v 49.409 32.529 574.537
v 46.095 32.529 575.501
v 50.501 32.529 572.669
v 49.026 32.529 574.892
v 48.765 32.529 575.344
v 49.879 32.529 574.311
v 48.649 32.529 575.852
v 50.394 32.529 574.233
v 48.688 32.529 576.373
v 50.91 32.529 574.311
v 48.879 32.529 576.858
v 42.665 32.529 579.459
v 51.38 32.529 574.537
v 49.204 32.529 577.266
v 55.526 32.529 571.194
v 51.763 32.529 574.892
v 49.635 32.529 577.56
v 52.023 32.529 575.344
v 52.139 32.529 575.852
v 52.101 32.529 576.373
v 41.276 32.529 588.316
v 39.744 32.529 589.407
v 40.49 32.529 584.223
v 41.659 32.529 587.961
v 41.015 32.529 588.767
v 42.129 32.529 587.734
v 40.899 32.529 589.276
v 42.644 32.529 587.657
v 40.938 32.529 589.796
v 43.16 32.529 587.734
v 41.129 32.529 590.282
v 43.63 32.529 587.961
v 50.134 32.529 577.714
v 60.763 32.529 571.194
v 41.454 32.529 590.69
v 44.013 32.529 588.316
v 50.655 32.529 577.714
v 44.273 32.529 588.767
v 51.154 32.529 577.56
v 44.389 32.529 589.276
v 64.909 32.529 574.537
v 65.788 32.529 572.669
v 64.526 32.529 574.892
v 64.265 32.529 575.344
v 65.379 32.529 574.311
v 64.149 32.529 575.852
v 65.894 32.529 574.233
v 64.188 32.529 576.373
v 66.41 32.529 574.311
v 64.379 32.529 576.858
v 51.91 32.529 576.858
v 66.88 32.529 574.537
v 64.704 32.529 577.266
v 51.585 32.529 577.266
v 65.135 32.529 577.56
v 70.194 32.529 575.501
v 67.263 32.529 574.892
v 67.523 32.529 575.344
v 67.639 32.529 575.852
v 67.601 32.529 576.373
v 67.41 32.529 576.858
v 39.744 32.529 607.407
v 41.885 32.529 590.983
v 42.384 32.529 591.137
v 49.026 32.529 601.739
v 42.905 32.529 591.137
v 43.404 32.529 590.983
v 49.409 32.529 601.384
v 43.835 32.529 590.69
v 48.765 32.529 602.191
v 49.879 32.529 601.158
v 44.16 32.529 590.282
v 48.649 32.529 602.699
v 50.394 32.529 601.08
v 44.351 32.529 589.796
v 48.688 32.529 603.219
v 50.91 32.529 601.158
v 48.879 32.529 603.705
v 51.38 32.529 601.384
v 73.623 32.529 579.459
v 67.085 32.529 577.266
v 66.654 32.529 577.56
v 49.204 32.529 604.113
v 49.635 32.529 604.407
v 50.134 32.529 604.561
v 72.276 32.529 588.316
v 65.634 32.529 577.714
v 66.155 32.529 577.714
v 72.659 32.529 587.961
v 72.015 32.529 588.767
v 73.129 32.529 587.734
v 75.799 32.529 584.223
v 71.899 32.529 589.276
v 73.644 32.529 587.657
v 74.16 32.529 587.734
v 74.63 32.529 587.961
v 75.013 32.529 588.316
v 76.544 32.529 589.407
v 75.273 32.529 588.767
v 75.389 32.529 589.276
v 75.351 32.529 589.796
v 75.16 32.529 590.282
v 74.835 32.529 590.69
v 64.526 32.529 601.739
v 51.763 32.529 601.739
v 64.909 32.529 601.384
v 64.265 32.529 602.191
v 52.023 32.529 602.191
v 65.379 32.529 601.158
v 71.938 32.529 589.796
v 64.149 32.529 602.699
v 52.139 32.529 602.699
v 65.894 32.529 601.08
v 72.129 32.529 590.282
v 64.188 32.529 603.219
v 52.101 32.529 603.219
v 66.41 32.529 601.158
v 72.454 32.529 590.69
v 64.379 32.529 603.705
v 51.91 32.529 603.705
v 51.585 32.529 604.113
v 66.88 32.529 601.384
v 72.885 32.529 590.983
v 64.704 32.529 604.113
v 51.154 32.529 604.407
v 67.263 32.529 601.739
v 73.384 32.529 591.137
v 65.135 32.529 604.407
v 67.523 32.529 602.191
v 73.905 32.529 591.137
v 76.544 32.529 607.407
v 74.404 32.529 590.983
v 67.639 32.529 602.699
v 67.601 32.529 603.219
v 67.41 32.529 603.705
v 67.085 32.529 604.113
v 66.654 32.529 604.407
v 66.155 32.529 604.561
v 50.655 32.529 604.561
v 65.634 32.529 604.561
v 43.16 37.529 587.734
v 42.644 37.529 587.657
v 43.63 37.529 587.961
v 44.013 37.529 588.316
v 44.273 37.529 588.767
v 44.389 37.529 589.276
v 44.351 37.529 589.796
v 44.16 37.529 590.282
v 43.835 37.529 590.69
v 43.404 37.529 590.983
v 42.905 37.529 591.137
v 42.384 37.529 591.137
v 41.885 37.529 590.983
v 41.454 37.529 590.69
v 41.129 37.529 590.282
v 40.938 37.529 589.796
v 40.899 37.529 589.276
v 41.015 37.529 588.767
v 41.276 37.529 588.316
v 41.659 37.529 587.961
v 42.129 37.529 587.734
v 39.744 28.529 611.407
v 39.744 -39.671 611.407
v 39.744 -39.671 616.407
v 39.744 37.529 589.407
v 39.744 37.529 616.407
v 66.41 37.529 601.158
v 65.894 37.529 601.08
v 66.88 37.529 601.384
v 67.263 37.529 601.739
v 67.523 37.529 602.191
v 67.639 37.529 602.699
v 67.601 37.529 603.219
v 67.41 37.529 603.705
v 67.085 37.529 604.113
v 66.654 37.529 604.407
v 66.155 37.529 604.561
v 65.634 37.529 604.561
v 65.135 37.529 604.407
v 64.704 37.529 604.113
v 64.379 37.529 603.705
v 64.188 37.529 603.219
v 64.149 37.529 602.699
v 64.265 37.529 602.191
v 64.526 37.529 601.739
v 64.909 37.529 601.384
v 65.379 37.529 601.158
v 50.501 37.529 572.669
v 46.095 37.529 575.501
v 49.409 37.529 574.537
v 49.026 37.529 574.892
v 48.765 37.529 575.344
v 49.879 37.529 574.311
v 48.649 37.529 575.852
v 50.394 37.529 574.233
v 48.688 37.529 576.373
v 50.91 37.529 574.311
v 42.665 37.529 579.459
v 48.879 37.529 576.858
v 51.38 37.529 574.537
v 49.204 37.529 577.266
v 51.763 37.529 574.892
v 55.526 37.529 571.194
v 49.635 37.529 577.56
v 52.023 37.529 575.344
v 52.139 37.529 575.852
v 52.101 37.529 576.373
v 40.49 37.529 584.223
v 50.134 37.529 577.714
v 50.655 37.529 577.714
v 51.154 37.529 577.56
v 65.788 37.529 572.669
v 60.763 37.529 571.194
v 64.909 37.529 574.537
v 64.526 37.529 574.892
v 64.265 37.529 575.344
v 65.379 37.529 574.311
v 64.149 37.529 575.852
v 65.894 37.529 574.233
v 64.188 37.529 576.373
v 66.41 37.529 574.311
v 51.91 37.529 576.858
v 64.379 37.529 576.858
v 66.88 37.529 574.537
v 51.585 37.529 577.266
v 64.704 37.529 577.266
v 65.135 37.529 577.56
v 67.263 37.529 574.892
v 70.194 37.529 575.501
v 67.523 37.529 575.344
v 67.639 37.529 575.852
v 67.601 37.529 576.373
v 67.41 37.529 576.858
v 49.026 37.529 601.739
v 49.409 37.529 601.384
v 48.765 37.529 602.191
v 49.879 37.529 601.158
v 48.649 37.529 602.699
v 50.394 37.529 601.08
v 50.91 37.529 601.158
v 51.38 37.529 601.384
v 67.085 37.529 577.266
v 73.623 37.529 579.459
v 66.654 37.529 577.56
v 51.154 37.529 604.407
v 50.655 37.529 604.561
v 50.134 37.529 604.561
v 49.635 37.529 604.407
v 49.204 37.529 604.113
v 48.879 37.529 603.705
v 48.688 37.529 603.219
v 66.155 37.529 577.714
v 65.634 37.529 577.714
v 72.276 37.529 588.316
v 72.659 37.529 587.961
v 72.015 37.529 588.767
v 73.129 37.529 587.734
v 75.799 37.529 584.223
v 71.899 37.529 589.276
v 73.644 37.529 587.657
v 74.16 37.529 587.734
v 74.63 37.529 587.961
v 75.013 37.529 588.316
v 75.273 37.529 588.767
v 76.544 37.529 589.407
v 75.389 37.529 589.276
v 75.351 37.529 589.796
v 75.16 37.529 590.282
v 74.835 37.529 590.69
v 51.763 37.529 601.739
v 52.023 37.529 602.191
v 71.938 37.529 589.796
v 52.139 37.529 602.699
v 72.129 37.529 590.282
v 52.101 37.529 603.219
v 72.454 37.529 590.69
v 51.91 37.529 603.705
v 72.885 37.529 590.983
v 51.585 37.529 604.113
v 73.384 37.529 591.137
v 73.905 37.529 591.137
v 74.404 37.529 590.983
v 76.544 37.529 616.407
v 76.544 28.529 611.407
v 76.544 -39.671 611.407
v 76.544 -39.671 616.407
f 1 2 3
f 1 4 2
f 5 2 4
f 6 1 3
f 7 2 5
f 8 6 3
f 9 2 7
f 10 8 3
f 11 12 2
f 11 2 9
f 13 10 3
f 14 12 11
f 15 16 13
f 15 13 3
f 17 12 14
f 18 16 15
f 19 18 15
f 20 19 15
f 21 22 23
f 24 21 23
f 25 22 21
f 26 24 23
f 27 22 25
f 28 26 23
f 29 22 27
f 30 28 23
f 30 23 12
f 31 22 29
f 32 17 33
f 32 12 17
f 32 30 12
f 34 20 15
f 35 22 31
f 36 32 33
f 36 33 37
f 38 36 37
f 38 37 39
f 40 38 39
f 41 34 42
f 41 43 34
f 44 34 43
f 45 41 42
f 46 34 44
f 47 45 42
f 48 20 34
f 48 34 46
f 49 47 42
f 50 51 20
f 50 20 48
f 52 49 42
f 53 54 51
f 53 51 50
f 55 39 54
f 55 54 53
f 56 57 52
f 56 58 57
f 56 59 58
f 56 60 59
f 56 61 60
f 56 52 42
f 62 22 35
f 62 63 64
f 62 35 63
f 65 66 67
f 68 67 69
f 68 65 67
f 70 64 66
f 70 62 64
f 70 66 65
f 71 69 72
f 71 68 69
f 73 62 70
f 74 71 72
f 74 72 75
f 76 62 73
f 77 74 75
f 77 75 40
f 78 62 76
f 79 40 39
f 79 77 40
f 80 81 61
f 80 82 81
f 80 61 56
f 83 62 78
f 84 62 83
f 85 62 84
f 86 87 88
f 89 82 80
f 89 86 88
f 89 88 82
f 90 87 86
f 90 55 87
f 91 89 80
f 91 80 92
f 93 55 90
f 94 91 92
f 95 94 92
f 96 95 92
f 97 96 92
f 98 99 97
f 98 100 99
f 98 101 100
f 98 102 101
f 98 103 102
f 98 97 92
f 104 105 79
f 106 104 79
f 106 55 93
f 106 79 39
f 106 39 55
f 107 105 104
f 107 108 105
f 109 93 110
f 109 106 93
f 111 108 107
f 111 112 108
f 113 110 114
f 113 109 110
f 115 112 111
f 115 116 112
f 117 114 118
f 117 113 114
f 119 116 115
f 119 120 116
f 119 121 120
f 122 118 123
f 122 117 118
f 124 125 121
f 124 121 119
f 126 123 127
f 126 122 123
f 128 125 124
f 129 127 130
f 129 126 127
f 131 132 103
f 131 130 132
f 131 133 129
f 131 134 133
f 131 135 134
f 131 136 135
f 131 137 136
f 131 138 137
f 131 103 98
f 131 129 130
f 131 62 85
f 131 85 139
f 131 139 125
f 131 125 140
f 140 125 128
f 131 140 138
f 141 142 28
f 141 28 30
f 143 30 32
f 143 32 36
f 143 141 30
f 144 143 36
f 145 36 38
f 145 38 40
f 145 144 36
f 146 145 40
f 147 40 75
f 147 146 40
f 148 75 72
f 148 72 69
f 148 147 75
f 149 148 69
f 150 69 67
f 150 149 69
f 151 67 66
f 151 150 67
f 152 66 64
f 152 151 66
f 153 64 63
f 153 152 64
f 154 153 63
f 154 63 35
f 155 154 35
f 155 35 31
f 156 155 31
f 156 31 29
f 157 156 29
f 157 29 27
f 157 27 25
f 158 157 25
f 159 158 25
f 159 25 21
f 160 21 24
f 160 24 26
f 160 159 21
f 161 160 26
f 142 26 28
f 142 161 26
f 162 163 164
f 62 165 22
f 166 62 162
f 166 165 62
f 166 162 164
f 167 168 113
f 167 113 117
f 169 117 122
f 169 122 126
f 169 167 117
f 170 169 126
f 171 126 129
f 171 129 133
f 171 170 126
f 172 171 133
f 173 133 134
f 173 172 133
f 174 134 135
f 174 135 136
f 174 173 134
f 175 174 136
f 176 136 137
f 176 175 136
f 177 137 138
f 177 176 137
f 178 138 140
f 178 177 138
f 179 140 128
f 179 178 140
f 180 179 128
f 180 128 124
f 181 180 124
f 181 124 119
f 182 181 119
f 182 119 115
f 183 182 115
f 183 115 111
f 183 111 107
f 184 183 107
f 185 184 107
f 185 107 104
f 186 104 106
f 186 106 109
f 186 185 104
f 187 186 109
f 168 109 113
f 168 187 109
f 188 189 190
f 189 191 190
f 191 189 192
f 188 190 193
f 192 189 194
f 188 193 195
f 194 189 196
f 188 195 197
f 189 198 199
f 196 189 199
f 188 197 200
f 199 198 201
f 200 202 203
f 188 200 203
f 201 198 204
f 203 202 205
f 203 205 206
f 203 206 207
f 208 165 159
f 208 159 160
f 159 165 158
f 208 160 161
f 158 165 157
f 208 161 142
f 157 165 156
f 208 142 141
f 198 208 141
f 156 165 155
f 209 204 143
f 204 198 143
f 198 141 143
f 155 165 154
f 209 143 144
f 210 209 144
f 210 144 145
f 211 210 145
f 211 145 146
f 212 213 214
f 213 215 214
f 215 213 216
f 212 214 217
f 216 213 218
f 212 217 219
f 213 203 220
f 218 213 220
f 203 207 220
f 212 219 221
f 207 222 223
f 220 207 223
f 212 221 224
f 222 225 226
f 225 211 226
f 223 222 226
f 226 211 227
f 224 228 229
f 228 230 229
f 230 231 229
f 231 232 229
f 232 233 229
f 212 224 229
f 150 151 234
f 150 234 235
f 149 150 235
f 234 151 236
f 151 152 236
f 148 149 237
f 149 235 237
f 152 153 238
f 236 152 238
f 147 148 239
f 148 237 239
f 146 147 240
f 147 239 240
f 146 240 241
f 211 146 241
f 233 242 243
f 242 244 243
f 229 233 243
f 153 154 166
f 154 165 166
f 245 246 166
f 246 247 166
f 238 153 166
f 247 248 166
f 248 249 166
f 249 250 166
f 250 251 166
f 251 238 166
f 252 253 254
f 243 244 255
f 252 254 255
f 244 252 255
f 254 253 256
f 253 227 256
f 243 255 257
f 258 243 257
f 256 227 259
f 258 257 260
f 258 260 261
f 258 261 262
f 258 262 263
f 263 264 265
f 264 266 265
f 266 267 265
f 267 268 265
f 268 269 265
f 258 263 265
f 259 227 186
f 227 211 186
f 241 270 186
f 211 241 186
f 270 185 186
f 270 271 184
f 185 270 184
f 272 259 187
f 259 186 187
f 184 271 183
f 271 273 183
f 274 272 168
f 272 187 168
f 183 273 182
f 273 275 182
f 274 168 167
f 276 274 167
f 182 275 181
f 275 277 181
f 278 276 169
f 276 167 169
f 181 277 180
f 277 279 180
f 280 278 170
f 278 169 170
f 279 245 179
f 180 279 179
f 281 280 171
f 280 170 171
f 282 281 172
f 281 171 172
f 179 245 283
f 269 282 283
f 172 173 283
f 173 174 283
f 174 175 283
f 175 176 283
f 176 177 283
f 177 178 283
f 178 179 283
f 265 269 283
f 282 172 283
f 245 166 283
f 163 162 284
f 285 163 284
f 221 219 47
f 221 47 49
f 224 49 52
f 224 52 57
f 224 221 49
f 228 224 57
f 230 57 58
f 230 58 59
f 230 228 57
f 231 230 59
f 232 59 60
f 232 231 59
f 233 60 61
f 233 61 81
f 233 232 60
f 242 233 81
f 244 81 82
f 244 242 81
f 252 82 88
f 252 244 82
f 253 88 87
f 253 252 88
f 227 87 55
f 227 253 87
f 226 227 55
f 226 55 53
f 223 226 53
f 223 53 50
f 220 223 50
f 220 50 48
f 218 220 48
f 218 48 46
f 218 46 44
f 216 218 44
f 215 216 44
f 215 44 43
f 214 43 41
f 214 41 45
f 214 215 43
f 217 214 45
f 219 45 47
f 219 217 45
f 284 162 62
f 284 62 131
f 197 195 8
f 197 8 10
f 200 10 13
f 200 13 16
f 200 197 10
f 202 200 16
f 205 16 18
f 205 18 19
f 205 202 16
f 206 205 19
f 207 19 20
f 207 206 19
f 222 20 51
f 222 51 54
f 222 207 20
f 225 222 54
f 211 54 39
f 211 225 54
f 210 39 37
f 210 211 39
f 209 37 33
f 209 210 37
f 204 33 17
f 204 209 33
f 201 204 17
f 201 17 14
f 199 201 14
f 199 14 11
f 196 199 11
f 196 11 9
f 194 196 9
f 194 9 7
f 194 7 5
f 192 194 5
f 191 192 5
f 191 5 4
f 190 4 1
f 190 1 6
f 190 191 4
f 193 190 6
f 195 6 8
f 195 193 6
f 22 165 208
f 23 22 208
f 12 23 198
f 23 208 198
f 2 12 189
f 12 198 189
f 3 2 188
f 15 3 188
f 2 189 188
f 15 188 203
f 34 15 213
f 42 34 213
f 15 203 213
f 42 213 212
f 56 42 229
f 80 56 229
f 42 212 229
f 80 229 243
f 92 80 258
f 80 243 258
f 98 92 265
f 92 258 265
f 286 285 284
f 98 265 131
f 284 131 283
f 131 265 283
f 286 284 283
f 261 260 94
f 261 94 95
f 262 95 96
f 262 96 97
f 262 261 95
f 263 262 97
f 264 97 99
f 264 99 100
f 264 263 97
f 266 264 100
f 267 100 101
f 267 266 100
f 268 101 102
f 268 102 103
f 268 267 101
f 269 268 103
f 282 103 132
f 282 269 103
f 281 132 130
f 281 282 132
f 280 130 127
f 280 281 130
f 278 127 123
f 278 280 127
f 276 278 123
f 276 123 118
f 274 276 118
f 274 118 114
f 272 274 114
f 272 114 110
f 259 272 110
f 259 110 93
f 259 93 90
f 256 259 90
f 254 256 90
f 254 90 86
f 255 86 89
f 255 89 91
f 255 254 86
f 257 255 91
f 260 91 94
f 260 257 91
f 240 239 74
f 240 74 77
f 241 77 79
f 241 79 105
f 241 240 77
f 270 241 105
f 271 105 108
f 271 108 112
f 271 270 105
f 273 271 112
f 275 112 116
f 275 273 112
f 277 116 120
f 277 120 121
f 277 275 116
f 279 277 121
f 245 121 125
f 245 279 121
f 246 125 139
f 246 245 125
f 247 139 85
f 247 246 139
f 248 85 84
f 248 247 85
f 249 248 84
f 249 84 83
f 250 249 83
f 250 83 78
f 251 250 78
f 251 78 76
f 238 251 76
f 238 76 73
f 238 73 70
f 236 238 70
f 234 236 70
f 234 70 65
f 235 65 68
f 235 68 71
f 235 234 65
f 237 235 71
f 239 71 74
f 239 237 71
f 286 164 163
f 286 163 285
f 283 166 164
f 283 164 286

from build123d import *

# Parameters (mm, degrees)
SZKIC2_R                    = 1.75
DODANIE_WYCI_GNI_CIE1_DEPTH = 5
SZKIC3_W                    = 36.8
SZKIC3_H                    = 5
DODANIE_WYCI_GNI_CIE2_DEPTH = 72.2
SFAZOWANIE1_SIZE            = 4


with BuildPart() as part:
    # Szkic2 → Dodanie-wyciągnięcie1 (new body)
    with BuildSketch(Plane.XZ.offset(-37.529198257)):
        with BuildLine():
            Line((76.54438393, 616.406662223), (39.74438393, 616.406662223))
            Line((39.74438393, 616.406662223), (39.74438393, 589.406662223))
            ThreePointArc((39.74438393, 589.406662223), (58.14438393, 571.006662223), (76.54438393, 589.406662223))
            Line((76.54438393, 589.406662223), (76.54438393, 616.406662223))
        make_face()
        with Locations(Location((50.39438393, 575.983268464, 0), (0, 0, 270))):
            Circle(SZKIC2_R, mode=Mode.SUBTRACT)
        with Locations(Location((65.89438393, 575.983268464, 0), (0, 0, 270))):
            Circle(SZKIC2_R, mode=Mode.SUBTRACT)
        with Locations(Location((73.64438393, 589.406662223, 0), (0, 0, 270))):
            Circle(SZKIC2_R, mode=Mode.SUBTRACT)
        with Locations(Location((65.89438393, 602.830055981, 0), (0, 0, 270))):
            Circle(SZKIC2_R, mode=Mode.SUBTRACT)
        with Locations(Location((50.39438393, 602.830055981, 0), (0, 0, 270))):
            Circle(SZKIC2_R, mode=Mode.SUBTRACT)
        with Locations(Location((42.64438393, 589.406662223, 0), (0, 0, 270))):
            Circle(SZKIC2_R, mode=Mode.SUBTRACT)
    extrude(amount=DODANIE_WYCI_GNI_CIE1_DEPTH)

    # Szkic3 → Dodanie-wyciągnięcie2 (add)
    with BuildSketch(Plane.XZ.offset(-32.529198257)):
        with Locations((58.14438393, 613.906662223)):
            Rectangle(SZKIC3_W, SZKIC3_H)
    extrude(amount=DODANIE_WYCI_GNI_CIE2_DEPTH)

    # Sfazowanie1
    sfazowanie1_edges = [part.edges().sort_by_distance(p)[0] for p in [
        (58.14438393, 32.529198257, 611.406662223),
    ]]
    chamfer(sfazowanie1_edges, length=SFAZOWANIE1_SIZE)


solid = part.part
